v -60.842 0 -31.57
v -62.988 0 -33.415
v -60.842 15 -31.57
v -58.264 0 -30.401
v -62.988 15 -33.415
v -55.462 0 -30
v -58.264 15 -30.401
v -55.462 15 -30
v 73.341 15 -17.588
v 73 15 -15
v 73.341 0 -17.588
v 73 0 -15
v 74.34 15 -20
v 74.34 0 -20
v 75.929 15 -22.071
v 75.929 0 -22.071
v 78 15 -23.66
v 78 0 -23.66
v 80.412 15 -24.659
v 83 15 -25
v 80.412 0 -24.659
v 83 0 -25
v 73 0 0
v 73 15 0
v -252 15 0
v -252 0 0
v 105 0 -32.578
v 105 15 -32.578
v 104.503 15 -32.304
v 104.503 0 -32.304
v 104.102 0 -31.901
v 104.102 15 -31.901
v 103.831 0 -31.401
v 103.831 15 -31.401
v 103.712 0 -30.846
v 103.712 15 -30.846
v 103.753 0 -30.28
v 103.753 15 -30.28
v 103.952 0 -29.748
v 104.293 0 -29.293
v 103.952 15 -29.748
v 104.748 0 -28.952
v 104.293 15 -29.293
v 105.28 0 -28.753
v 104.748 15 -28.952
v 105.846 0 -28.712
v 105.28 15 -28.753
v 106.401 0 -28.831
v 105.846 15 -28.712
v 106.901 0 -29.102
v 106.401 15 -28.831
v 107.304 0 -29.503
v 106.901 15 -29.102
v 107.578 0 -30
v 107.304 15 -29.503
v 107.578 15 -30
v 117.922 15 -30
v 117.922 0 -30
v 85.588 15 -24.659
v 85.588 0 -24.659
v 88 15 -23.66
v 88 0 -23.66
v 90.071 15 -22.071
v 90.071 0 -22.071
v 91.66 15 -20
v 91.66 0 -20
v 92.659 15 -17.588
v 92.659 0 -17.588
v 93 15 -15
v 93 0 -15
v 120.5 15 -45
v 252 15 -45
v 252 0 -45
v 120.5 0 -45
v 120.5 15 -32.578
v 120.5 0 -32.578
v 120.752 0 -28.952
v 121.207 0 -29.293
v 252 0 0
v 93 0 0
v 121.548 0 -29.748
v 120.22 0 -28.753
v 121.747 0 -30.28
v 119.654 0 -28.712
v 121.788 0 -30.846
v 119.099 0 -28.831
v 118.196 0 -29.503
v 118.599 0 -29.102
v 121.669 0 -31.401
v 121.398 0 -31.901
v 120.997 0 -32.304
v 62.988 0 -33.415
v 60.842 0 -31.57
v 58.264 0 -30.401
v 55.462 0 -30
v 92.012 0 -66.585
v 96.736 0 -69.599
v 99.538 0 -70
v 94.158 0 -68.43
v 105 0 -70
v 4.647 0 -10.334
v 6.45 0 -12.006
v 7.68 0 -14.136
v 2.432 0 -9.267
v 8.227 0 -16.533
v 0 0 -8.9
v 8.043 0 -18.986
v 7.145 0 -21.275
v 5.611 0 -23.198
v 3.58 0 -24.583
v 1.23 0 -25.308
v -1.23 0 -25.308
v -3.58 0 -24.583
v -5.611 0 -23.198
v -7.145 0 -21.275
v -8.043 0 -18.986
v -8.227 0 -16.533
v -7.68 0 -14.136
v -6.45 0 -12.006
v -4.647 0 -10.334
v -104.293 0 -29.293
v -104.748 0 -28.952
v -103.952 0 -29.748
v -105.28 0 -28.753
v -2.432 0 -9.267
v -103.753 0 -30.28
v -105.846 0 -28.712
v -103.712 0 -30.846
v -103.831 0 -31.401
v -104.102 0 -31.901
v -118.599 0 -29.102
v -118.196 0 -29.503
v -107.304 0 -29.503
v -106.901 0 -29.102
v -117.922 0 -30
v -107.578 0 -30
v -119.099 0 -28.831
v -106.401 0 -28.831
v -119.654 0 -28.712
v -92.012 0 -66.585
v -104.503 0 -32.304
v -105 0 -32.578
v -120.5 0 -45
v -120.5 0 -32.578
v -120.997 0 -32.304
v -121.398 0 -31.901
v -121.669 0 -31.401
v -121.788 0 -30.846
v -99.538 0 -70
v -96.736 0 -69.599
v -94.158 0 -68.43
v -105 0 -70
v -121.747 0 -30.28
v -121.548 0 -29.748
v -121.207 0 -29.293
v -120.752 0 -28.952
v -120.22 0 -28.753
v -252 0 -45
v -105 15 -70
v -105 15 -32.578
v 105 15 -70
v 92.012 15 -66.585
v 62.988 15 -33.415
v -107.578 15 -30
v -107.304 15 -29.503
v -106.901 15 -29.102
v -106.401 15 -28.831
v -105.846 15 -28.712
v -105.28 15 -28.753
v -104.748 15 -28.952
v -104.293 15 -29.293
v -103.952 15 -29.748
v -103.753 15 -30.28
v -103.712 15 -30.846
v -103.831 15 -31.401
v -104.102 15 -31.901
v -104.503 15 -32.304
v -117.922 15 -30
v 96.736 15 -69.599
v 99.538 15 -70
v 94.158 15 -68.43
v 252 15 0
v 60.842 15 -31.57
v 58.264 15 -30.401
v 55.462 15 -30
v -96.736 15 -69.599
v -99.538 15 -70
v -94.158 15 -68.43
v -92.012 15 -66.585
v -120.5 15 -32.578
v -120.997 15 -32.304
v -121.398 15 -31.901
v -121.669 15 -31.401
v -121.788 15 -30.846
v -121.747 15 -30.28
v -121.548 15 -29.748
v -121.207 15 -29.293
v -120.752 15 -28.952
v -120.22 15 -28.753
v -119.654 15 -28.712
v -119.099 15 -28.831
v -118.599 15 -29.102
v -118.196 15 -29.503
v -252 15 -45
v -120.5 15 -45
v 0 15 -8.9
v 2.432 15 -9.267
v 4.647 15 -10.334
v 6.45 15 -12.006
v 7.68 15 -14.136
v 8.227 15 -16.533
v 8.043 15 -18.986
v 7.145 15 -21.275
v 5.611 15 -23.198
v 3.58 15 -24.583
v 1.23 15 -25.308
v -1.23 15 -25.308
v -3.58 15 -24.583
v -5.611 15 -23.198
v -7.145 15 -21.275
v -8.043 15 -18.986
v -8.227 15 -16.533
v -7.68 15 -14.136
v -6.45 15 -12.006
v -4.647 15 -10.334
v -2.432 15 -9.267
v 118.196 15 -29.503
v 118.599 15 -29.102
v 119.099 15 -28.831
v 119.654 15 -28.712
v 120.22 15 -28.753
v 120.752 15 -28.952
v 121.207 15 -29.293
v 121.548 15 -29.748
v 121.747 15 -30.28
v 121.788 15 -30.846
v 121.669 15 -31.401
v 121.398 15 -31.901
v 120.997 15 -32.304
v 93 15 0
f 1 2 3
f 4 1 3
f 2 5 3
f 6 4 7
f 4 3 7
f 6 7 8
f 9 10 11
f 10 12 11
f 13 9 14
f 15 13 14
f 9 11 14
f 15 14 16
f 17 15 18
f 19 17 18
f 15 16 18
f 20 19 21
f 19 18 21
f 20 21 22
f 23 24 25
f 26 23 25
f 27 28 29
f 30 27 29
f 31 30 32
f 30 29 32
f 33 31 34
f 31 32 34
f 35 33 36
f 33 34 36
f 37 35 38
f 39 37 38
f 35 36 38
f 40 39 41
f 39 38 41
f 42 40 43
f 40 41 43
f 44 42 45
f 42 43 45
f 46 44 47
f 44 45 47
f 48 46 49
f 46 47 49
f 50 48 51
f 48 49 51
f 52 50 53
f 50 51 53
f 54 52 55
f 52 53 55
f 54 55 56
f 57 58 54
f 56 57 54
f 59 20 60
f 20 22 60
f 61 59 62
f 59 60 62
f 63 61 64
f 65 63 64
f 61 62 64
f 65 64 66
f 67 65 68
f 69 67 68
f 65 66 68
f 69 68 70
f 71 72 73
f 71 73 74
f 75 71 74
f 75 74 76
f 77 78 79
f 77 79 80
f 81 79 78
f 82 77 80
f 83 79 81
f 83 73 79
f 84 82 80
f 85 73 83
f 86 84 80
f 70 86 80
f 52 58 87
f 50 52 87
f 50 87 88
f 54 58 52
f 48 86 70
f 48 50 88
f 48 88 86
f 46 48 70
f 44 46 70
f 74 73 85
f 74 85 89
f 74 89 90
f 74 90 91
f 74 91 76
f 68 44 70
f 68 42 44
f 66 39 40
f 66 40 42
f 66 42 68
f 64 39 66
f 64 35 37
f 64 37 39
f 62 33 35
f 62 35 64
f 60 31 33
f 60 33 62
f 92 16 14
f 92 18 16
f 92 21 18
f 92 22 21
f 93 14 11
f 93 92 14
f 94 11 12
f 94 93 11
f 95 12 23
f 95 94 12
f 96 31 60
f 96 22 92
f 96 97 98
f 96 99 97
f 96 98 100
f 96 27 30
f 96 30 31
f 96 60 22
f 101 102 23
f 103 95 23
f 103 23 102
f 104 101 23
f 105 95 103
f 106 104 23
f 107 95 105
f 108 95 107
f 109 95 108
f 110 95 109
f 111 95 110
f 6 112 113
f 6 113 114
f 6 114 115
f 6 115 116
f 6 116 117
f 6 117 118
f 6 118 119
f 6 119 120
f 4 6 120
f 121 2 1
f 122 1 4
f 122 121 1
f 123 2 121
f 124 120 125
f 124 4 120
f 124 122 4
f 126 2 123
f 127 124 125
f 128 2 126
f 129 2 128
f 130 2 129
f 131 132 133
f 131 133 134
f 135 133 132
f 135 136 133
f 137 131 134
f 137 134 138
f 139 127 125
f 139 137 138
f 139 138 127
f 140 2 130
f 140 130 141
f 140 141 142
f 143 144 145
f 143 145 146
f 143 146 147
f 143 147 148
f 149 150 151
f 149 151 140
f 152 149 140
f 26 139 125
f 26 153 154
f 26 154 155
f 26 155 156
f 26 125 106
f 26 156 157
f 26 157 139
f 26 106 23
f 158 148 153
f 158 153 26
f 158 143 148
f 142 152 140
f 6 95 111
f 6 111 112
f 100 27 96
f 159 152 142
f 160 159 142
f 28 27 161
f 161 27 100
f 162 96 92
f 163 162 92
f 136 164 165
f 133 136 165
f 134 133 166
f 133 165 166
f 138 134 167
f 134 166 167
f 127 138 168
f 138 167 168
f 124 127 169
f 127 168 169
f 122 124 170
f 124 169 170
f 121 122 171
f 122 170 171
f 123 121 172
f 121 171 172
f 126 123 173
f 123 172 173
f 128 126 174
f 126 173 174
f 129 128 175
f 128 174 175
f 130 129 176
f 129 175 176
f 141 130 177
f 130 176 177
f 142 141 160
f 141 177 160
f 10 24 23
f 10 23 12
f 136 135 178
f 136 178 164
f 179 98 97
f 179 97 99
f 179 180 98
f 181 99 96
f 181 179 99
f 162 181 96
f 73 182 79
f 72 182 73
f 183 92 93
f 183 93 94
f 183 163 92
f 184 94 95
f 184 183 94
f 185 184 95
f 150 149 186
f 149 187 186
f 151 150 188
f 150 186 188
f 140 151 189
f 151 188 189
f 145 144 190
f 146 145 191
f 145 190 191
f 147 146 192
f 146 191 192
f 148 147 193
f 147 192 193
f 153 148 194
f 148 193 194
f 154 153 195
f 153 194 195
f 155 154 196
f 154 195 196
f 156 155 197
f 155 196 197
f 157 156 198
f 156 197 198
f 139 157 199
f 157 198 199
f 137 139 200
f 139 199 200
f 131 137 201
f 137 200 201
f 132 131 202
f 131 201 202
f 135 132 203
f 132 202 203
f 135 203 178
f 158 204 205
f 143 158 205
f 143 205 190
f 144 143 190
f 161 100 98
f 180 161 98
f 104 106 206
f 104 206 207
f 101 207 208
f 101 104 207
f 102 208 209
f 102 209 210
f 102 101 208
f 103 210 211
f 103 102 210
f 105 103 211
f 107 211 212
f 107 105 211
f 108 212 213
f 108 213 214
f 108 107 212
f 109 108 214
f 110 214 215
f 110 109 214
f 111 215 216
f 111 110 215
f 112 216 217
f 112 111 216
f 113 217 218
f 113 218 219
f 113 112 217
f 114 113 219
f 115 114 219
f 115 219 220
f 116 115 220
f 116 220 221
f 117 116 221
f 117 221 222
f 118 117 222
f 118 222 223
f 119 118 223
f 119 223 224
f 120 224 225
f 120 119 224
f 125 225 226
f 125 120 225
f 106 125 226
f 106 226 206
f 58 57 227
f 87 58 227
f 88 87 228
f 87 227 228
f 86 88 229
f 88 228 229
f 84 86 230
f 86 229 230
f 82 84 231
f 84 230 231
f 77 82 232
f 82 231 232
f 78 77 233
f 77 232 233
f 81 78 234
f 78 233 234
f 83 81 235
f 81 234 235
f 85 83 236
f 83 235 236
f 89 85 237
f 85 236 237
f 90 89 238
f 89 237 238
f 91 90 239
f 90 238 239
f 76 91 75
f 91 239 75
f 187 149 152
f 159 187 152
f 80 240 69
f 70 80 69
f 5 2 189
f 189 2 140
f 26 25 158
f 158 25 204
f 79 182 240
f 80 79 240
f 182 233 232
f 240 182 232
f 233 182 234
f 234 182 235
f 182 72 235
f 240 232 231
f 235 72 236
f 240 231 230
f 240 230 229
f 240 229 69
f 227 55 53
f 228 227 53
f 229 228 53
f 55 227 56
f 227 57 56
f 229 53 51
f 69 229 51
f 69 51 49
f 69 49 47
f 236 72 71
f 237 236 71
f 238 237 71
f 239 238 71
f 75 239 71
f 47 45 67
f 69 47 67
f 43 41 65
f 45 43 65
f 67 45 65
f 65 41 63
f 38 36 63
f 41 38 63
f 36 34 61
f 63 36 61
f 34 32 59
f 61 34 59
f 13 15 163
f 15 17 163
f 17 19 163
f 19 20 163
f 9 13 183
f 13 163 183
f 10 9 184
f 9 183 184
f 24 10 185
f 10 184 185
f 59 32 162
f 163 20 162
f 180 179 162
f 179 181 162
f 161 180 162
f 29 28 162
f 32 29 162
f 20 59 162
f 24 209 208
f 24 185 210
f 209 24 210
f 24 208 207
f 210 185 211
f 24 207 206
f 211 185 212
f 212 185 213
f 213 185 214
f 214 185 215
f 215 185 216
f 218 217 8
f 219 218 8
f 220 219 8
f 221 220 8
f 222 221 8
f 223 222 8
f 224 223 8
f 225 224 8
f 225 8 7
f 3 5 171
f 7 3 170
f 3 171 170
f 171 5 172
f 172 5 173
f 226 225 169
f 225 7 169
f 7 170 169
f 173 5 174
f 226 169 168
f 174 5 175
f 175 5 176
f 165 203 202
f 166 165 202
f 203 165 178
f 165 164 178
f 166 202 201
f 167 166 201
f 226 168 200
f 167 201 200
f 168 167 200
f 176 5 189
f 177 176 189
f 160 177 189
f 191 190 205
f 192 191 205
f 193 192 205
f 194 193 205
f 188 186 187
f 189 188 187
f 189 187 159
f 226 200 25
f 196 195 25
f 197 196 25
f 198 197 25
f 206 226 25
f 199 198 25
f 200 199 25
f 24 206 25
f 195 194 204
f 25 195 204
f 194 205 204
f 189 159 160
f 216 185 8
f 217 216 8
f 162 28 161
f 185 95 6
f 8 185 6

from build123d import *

# Parameters (mm, degrees)
SKETCH1_R           = 8.25
BOSS_EXTRUDE1_DEPTH = 15
FILLET1_R           = 10
BOSS_EXTRUDE2_DEPTH = 15
SKETCH3_W           = 20
SKETCH3_H           = 25
CUT_EXTRUDE1_DEPTH  = 262.971372482
FILLET2_R           = 10
SKETCH4_R           = 2
CUT_EXTRUDE2_DEPTH  = 262.971372482


with BuildPart() as part:
    # Sketch1 → Boss-Extrude1 (new body)
    with BuildSketch(Plane(origin=(0, 0, 0), x_dir=(1, 0, 0), z_dir=(0, 1, 0))):
        Polygon((-105, 0), (105, 0), (105, 70), (95, 70), (60, 30), (-60, 30), (-95, 70), (-105, 70), align=None)
        with Locations(Location((0, 17.15, 0), (0, 0, 270))):
            Circle(SKETCH1_R, mode=Mode.SUBTRACT)
    extrude(amount=BOSS_EXTRUDE1_DEPTH)

    # Fillet1
    fillet1_edges = [part.edges().sort_by_distance(p)[0] for p in [
        (-95, 7.5, -70),
        (-60, 7.5, -30),
        (60, 7.5, -30),
        (95, 7.5, -70),
    ]]
    fillet(fillet1_edges, radius=FILLET1_R)

    # Sketch2 → Boss-Extrude2 (add)
    with BuildSketch(Plane(origin=(0, 15, 0), x_dir=(1, 0, 0), z_dir=(0, 1, 0))):
        Polygon((105, 0), (252, 0), (252, 45), (120.5, 45), (120.5, 30), (105, 30), align=None)
    boss_extrude2 = extrude(amount=-BOSS_EXTRUDE2_DEPTH)

    # Mirror1: Boss-Extrude2 across plane
    add(boss_extrude2.mirror(Plane(origin=(0, 0, 0), x_dir=(0, 0, 1), z_dir=(1, 0, 0))))

    # Sketch3 → Cut-Extrude1 (cut, through all)
    with BuildSketch(Plane(origin=(0, 15, 0), x_dir=(1, 0, 0), z_dir=(0, 1, 0))):
        with Locations((83, 12.5)):
            Rectangle(SKETCH3_W, SKETCH3_H)
    extrude(amount=-CUT_EXTRUDE1_DEPTH, mode=Mode.SUBTRACT)

    # Fillet2
    fillet2_edges = [part.edges().sort_by_distance(p)[0] for p in [
        (73, 7.5, -25),
        (93, 7.5, -25),
    ]]
    fillet(fillet2_edges, radius=FILLET2_R - 0.0001)  # a hair under: the kernel refuses the full size

    # Sketch4 → Cut-Extrude2 (cut, through all)
    with BuildSketch(Plane(origin=(0, 15, 0), x_dir=(1, 0, 0), z_dir=(0, 1, 0))):
        with Locations((-119.792893219, 30.707106781)):
            Circle(SKETCH4_R)
        with Locations((-105.707106781, 30.707106781)):
            Circle(SKETCH4_R)
        with Locations((105.707106781, 30.707106781)):
            Circle(SKETCH4_R)
        with Locations((119.792893219, 30.707106781)):
            Circle(SKETCH4_R)
    extrude(amount=-CUT_EXTRUDE2_DEPTH, mode=Mode.SUBTRACT)


solid = part.part
